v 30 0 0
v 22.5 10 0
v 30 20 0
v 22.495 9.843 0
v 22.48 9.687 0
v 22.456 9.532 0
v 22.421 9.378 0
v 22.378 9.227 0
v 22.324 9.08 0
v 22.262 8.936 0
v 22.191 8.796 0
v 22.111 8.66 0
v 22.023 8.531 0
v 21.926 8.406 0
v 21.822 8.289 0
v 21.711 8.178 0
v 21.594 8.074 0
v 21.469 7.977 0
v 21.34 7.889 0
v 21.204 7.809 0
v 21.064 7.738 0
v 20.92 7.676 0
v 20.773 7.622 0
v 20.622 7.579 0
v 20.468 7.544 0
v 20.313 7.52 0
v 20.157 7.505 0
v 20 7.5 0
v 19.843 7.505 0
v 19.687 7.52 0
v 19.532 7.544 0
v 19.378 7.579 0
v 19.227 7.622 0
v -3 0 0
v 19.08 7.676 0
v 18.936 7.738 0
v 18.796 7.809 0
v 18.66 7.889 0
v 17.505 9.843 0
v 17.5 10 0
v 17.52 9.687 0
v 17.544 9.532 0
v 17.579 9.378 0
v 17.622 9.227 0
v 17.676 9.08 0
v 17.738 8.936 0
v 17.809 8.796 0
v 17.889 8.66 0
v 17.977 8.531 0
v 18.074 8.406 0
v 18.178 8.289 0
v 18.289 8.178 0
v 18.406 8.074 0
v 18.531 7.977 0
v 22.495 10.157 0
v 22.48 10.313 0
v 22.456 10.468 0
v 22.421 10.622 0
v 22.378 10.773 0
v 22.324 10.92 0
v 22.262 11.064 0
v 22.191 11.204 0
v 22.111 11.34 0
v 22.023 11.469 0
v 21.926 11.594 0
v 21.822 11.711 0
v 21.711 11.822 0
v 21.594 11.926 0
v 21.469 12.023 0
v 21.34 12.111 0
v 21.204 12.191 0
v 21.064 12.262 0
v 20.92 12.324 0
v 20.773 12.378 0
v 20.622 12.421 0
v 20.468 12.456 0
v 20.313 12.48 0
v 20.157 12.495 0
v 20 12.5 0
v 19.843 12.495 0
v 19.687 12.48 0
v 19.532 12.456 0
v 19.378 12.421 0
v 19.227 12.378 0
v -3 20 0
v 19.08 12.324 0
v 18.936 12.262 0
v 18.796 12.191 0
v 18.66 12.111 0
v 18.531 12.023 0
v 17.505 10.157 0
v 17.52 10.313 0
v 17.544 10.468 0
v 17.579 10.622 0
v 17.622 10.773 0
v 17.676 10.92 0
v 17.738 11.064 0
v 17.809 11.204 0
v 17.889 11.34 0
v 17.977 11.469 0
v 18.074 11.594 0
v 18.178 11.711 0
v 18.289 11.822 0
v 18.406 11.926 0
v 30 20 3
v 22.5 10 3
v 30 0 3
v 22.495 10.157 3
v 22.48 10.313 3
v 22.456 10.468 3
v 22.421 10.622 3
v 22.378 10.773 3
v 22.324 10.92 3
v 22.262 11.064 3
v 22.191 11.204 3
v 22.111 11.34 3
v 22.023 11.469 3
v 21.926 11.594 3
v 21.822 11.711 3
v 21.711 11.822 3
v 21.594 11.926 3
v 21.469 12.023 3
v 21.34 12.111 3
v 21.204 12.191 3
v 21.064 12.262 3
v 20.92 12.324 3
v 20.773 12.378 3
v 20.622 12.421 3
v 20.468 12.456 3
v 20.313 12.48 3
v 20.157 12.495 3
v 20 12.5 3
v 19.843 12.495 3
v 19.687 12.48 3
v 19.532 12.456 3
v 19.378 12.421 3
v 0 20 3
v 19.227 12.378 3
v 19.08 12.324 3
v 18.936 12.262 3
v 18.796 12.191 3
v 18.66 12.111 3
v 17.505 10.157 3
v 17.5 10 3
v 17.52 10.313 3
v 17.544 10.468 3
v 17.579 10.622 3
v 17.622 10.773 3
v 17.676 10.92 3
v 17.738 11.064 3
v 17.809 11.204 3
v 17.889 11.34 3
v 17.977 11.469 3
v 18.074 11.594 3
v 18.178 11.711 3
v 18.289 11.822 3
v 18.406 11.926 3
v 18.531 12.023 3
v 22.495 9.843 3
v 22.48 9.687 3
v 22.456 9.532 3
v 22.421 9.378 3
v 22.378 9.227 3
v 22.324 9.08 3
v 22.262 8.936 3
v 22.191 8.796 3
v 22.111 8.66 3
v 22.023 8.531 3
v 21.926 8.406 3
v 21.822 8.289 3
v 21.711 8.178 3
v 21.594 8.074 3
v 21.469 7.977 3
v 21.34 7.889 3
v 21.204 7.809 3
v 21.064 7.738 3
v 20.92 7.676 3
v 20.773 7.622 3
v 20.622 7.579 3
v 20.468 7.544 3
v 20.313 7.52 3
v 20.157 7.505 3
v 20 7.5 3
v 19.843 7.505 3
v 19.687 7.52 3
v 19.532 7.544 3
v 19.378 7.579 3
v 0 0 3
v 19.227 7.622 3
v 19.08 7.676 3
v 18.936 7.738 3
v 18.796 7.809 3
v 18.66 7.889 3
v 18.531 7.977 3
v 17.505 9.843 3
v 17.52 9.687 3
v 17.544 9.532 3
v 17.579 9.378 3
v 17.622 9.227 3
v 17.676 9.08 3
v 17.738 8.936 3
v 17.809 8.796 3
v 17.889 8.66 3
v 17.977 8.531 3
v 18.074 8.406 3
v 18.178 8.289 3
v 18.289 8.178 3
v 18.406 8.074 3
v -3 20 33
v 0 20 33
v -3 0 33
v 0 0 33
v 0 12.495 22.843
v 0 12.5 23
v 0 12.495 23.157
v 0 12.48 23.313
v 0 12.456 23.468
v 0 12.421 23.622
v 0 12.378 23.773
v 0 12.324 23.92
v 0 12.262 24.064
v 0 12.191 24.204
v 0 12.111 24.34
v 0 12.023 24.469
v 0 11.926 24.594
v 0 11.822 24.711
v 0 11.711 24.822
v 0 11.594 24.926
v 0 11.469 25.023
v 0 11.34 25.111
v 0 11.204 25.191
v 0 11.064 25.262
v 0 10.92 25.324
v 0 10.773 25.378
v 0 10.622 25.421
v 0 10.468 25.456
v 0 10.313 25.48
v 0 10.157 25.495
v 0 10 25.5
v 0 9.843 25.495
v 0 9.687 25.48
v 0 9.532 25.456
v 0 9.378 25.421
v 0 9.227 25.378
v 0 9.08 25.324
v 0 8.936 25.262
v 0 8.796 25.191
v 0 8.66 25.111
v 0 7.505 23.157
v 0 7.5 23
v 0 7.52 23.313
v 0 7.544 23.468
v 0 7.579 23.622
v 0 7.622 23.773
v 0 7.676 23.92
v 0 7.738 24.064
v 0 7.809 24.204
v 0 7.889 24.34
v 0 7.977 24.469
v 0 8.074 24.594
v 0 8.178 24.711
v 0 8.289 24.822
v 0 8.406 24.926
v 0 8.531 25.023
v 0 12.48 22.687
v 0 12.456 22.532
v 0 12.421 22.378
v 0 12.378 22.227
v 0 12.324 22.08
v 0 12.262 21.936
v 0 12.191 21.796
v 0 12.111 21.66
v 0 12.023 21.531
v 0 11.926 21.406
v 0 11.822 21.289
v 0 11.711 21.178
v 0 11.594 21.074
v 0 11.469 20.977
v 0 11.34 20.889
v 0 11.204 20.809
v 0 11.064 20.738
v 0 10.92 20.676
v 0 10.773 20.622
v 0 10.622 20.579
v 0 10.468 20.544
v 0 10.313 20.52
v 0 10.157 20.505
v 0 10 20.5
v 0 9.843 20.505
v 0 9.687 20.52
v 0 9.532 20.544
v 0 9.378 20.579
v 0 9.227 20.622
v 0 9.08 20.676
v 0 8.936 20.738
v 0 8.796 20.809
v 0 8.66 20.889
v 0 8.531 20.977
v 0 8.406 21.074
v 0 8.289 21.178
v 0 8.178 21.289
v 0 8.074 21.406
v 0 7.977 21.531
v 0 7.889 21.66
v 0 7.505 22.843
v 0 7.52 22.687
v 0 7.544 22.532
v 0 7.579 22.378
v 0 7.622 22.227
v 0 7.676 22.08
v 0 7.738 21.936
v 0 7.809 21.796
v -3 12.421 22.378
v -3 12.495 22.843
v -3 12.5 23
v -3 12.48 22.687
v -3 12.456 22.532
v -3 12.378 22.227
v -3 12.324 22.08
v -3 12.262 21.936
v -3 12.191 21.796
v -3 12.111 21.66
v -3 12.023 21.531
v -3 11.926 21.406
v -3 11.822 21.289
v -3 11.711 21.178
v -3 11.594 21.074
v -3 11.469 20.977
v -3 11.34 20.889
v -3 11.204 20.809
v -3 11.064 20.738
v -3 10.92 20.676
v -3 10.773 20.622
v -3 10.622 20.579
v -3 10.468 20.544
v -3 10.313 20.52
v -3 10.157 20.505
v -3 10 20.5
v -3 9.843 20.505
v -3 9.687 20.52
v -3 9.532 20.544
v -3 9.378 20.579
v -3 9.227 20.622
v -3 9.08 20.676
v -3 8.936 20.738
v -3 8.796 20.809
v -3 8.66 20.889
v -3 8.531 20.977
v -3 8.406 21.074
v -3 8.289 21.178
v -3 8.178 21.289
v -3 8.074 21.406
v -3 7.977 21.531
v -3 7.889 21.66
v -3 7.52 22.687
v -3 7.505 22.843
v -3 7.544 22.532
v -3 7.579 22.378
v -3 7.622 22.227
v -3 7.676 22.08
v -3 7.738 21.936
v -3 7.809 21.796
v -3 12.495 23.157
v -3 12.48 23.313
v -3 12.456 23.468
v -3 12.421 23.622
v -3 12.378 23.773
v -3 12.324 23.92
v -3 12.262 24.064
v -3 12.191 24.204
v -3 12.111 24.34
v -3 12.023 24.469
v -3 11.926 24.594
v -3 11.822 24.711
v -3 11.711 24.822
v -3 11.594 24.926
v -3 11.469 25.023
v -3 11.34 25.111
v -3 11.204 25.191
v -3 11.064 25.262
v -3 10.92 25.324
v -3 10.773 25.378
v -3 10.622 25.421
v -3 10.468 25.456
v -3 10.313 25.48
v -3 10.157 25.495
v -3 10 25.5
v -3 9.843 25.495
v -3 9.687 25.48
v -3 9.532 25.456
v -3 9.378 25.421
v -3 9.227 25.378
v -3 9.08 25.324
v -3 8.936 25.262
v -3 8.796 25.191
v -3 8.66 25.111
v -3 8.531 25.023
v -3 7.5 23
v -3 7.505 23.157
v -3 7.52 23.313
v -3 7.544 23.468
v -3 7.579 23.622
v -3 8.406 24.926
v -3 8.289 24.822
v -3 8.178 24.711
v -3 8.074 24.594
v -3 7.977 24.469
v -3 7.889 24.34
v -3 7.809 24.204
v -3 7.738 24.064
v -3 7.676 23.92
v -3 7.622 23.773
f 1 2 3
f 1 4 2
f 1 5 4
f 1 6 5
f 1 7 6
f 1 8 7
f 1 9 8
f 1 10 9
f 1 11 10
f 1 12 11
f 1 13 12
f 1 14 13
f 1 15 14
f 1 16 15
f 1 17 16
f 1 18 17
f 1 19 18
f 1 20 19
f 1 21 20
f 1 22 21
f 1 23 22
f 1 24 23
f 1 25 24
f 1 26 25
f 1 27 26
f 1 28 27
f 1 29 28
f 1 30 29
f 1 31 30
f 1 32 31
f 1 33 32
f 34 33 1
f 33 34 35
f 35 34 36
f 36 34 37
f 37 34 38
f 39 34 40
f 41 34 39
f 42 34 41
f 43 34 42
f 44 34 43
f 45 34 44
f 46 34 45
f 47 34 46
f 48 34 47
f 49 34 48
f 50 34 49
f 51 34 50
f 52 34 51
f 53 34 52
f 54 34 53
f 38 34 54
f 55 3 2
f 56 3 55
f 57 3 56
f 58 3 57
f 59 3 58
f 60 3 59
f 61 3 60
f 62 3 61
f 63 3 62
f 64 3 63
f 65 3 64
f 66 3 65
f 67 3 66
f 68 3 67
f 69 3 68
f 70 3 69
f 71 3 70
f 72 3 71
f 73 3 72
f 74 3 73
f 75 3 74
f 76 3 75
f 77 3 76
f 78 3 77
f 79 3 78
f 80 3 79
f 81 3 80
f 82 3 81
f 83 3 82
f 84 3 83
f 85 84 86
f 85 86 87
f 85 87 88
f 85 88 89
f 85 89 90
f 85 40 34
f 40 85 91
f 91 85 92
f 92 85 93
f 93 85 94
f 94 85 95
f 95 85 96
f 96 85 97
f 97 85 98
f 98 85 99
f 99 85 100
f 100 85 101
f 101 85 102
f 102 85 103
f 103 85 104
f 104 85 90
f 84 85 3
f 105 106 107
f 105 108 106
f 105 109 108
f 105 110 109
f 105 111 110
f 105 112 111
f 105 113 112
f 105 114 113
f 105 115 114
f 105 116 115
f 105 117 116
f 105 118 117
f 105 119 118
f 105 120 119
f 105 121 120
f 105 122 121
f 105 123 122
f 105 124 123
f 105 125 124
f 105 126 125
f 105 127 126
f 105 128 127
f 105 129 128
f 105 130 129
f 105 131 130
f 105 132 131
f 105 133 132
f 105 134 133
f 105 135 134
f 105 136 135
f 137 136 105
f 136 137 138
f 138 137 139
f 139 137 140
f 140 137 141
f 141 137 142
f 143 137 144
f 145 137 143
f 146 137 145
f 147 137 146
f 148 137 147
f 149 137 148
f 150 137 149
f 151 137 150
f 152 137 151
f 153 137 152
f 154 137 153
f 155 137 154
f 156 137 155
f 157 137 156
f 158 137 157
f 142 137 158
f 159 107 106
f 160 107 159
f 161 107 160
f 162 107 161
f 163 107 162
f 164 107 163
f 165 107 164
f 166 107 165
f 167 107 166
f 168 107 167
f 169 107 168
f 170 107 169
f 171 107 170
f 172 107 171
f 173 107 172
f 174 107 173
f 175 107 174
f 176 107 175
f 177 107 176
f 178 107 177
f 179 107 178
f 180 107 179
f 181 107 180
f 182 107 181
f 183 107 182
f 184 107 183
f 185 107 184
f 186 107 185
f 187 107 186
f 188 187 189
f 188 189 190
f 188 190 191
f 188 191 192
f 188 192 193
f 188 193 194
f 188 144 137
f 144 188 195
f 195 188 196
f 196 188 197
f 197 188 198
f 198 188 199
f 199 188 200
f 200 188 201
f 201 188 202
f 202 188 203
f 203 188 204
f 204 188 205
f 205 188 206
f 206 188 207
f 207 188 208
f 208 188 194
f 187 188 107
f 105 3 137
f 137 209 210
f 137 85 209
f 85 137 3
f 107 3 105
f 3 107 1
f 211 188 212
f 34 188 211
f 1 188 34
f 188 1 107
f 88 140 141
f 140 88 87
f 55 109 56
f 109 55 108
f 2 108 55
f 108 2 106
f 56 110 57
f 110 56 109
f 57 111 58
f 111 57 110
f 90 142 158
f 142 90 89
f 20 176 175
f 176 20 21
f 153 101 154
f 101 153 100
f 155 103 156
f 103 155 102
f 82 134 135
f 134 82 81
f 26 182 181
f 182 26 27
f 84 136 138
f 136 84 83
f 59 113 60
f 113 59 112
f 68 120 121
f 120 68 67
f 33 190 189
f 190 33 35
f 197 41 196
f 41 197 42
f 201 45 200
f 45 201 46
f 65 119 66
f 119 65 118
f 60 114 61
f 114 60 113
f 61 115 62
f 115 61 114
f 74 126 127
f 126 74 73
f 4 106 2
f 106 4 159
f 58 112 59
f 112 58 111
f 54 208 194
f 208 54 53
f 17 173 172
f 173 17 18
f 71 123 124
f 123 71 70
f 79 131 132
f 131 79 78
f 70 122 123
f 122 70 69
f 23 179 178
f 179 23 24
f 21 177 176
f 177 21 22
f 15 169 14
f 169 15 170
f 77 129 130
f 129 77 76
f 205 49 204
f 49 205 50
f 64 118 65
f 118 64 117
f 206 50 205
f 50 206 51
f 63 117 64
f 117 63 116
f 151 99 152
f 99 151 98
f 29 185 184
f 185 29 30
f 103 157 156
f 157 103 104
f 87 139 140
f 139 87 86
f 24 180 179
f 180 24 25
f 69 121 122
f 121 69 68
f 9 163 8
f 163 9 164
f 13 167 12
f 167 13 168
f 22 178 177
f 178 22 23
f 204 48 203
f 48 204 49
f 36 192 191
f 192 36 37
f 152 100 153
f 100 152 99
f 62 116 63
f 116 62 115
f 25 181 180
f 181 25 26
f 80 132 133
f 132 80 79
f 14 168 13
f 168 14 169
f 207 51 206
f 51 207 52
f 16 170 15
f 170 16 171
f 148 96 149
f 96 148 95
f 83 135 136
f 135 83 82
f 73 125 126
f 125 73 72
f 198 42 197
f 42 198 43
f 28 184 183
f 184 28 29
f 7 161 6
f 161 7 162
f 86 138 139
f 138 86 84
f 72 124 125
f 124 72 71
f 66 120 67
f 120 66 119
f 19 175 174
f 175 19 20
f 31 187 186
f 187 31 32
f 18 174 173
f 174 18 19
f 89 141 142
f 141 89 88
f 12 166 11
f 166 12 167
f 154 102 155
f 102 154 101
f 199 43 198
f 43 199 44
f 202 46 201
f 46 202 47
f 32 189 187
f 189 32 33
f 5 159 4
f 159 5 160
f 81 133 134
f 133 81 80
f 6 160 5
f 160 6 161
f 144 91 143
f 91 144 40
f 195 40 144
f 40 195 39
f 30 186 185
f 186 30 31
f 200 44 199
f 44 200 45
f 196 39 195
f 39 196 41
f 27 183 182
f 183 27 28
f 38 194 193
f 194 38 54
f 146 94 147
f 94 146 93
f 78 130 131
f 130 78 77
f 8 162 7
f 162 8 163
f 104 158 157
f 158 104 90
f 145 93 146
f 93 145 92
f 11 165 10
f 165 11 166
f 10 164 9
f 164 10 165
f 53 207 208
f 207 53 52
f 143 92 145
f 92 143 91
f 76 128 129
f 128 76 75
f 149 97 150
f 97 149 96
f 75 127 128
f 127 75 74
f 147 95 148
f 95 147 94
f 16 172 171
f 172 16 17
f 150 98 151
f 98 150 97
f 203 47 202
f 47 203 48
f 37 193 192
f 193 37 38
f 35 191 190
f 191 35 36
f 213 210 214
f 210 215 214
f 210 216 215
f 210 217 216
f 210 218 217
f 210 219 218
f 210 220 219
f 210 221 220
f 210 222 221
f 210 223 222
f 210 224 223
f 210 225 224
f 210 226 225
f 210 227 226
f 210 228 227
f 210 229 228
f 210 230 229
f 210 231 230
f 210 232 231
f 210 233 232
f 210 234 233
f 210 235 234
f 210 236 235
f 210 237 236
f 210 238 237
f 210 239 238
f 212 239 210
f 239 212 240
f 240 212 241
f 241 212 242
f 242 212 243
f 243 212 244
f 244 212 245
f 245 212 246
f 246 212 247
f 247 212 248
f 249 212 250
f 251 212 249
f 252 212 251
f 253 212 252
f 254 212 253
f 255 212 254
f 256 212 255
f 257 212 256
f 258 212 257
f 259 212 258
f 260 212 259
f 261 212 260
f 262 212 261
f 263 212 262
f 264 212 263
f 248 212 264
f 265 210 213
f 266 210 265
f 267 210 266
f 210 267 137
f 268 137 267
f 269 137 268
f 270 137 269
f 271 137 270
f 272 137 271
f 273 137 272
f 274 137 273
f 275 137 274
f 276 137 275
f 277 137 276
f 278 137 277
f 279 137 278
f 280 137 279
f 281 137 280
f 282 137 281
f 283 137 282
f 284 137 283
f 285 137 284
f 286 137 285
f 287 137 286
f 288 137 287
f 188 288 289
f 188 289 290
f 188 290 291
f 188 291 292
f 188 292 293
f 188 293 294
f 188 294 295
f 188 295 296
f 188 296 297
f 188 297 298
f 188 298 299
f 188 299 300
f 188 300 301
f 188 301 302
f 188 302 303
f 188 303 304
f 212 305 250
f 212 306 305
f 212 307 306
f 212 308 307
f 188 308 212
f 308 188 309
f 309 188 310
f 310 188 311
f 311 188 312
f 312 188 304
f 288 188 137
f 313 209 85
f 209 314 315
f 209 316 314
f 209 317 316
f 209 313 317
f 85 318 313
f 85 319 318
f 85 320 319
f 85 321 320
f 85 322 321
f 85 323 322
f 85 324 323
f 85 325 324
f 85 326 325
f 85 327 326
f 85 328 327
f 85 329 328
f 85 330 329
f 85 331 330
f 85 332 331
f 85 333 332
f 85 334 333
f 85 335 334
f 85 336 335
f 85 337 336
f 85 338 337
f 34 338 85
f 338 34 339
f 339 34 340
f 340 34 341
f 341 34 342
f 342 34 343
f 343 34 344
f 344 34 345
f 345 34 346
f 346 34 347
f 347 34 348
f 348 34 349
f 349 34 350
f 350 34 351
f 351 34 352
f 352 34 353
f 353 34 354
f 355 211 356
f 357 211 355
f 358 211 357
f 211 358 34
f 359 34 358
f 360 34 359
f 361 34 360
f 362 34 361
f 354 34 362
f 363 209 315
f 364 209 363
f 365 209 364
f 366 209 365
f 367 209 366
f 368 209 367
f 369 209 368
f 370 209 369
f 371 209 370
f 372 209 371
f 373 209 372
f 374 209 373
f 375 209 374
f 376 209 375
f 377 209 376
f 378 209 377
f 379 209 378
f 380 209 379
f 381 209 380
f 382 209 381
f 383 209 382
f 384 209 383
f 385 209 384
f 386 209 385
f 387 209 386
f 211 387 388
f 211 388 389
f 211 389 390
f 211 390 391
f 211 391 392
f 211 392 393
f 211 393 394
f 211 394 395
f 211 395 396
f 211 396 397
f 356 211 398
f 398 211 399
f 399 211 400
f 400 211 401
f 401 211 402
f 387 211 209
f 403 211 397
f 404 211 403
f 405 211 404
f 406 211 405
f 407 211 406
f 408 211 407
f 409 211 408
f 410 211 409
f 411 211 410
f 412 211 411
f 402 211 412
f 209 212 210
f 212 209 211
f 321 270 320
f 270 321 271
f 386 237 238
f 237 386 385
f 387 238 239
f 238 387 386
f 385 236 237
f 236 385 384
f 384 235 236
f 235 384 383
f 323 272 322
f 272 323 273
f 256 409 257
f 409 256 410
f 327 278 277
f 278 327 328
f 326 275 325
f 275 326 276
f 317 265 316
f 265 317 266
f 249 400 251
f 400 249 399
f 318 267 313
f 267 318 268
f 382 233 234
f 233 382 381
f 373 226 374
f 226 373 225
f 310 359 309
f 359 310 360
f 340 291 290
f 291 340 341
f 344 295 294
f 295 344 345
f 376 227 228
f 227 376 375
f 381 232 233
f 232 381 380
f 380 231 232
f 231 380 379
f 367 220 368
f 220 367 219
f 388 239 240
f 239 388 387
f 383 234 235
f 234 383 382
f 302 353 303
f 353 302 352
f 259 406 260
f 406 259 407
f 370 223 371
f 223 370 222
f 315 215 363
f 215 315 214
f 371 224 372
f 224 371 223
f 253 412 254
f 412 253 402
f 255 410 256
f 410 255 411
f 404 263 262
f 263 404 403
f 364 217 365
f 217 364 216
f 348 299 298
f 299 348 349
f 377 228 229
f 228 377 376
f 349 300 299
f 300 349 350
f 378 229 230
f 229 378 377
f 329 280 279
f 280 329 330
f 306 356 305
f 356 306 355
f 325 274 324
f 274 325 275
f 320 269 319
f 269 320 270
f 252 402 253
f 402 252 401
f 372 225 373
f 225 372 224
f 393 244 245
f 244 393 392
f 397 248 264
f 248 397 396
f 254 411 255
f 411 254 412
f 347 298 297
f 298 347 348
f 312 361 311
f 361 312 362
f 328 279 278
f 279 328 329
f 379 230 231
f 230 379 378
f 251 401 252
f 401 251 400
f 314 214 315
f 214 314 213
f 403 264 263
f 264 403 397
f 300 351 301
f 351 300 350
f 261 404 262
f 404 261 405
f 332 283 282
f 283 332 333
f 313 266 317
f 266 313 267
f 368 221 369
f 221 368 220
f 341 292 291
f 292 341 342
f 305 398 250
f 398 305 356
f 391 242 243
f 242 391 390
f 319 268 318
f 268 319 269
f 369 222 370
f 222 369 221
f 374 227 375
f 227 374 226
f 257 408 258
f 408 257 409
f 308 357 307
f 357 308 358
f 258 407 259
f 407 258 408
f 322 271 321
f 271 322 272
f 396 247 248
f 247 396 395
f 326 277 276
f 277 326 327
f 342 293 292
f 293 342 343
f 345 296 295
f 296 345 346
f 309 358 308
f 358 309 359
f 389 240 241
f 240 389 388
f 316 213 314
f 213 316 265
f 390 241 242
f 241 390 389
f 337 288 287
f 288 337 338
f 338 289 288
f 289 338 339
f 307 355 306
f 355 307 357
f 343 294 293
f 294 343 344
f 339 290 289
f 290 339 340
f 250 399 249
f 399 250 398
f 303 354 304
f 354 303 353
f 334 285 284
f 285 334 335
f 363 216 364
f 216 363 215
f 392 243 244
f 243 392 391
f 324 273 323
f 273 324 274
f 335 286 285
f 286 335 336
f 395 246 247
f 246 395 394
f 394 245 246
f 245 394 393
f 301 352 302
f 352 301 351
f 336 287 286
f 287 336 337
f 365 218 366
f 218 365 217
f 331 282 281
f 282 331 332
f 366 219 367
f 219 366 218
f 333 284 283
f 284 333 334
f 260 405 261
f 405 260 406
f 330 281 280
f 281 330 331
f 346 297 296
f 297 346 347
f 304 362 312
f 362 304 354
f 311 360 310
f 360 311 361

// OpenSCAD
thickness=3;
length=30;
width=20;
$fn=100;
module face() {
    difference() {
        linear_extrude(height=thickness)
        square([length, width]);
        translate([20, width/2])
        cylinder(r=2.5, h=thickness);
    }
}

translate([0,0,thickness])
rotate([0,-90,0])
face();
face();
translate([-thickness, 0, 0])
cube([thickness, width, thickness]);
